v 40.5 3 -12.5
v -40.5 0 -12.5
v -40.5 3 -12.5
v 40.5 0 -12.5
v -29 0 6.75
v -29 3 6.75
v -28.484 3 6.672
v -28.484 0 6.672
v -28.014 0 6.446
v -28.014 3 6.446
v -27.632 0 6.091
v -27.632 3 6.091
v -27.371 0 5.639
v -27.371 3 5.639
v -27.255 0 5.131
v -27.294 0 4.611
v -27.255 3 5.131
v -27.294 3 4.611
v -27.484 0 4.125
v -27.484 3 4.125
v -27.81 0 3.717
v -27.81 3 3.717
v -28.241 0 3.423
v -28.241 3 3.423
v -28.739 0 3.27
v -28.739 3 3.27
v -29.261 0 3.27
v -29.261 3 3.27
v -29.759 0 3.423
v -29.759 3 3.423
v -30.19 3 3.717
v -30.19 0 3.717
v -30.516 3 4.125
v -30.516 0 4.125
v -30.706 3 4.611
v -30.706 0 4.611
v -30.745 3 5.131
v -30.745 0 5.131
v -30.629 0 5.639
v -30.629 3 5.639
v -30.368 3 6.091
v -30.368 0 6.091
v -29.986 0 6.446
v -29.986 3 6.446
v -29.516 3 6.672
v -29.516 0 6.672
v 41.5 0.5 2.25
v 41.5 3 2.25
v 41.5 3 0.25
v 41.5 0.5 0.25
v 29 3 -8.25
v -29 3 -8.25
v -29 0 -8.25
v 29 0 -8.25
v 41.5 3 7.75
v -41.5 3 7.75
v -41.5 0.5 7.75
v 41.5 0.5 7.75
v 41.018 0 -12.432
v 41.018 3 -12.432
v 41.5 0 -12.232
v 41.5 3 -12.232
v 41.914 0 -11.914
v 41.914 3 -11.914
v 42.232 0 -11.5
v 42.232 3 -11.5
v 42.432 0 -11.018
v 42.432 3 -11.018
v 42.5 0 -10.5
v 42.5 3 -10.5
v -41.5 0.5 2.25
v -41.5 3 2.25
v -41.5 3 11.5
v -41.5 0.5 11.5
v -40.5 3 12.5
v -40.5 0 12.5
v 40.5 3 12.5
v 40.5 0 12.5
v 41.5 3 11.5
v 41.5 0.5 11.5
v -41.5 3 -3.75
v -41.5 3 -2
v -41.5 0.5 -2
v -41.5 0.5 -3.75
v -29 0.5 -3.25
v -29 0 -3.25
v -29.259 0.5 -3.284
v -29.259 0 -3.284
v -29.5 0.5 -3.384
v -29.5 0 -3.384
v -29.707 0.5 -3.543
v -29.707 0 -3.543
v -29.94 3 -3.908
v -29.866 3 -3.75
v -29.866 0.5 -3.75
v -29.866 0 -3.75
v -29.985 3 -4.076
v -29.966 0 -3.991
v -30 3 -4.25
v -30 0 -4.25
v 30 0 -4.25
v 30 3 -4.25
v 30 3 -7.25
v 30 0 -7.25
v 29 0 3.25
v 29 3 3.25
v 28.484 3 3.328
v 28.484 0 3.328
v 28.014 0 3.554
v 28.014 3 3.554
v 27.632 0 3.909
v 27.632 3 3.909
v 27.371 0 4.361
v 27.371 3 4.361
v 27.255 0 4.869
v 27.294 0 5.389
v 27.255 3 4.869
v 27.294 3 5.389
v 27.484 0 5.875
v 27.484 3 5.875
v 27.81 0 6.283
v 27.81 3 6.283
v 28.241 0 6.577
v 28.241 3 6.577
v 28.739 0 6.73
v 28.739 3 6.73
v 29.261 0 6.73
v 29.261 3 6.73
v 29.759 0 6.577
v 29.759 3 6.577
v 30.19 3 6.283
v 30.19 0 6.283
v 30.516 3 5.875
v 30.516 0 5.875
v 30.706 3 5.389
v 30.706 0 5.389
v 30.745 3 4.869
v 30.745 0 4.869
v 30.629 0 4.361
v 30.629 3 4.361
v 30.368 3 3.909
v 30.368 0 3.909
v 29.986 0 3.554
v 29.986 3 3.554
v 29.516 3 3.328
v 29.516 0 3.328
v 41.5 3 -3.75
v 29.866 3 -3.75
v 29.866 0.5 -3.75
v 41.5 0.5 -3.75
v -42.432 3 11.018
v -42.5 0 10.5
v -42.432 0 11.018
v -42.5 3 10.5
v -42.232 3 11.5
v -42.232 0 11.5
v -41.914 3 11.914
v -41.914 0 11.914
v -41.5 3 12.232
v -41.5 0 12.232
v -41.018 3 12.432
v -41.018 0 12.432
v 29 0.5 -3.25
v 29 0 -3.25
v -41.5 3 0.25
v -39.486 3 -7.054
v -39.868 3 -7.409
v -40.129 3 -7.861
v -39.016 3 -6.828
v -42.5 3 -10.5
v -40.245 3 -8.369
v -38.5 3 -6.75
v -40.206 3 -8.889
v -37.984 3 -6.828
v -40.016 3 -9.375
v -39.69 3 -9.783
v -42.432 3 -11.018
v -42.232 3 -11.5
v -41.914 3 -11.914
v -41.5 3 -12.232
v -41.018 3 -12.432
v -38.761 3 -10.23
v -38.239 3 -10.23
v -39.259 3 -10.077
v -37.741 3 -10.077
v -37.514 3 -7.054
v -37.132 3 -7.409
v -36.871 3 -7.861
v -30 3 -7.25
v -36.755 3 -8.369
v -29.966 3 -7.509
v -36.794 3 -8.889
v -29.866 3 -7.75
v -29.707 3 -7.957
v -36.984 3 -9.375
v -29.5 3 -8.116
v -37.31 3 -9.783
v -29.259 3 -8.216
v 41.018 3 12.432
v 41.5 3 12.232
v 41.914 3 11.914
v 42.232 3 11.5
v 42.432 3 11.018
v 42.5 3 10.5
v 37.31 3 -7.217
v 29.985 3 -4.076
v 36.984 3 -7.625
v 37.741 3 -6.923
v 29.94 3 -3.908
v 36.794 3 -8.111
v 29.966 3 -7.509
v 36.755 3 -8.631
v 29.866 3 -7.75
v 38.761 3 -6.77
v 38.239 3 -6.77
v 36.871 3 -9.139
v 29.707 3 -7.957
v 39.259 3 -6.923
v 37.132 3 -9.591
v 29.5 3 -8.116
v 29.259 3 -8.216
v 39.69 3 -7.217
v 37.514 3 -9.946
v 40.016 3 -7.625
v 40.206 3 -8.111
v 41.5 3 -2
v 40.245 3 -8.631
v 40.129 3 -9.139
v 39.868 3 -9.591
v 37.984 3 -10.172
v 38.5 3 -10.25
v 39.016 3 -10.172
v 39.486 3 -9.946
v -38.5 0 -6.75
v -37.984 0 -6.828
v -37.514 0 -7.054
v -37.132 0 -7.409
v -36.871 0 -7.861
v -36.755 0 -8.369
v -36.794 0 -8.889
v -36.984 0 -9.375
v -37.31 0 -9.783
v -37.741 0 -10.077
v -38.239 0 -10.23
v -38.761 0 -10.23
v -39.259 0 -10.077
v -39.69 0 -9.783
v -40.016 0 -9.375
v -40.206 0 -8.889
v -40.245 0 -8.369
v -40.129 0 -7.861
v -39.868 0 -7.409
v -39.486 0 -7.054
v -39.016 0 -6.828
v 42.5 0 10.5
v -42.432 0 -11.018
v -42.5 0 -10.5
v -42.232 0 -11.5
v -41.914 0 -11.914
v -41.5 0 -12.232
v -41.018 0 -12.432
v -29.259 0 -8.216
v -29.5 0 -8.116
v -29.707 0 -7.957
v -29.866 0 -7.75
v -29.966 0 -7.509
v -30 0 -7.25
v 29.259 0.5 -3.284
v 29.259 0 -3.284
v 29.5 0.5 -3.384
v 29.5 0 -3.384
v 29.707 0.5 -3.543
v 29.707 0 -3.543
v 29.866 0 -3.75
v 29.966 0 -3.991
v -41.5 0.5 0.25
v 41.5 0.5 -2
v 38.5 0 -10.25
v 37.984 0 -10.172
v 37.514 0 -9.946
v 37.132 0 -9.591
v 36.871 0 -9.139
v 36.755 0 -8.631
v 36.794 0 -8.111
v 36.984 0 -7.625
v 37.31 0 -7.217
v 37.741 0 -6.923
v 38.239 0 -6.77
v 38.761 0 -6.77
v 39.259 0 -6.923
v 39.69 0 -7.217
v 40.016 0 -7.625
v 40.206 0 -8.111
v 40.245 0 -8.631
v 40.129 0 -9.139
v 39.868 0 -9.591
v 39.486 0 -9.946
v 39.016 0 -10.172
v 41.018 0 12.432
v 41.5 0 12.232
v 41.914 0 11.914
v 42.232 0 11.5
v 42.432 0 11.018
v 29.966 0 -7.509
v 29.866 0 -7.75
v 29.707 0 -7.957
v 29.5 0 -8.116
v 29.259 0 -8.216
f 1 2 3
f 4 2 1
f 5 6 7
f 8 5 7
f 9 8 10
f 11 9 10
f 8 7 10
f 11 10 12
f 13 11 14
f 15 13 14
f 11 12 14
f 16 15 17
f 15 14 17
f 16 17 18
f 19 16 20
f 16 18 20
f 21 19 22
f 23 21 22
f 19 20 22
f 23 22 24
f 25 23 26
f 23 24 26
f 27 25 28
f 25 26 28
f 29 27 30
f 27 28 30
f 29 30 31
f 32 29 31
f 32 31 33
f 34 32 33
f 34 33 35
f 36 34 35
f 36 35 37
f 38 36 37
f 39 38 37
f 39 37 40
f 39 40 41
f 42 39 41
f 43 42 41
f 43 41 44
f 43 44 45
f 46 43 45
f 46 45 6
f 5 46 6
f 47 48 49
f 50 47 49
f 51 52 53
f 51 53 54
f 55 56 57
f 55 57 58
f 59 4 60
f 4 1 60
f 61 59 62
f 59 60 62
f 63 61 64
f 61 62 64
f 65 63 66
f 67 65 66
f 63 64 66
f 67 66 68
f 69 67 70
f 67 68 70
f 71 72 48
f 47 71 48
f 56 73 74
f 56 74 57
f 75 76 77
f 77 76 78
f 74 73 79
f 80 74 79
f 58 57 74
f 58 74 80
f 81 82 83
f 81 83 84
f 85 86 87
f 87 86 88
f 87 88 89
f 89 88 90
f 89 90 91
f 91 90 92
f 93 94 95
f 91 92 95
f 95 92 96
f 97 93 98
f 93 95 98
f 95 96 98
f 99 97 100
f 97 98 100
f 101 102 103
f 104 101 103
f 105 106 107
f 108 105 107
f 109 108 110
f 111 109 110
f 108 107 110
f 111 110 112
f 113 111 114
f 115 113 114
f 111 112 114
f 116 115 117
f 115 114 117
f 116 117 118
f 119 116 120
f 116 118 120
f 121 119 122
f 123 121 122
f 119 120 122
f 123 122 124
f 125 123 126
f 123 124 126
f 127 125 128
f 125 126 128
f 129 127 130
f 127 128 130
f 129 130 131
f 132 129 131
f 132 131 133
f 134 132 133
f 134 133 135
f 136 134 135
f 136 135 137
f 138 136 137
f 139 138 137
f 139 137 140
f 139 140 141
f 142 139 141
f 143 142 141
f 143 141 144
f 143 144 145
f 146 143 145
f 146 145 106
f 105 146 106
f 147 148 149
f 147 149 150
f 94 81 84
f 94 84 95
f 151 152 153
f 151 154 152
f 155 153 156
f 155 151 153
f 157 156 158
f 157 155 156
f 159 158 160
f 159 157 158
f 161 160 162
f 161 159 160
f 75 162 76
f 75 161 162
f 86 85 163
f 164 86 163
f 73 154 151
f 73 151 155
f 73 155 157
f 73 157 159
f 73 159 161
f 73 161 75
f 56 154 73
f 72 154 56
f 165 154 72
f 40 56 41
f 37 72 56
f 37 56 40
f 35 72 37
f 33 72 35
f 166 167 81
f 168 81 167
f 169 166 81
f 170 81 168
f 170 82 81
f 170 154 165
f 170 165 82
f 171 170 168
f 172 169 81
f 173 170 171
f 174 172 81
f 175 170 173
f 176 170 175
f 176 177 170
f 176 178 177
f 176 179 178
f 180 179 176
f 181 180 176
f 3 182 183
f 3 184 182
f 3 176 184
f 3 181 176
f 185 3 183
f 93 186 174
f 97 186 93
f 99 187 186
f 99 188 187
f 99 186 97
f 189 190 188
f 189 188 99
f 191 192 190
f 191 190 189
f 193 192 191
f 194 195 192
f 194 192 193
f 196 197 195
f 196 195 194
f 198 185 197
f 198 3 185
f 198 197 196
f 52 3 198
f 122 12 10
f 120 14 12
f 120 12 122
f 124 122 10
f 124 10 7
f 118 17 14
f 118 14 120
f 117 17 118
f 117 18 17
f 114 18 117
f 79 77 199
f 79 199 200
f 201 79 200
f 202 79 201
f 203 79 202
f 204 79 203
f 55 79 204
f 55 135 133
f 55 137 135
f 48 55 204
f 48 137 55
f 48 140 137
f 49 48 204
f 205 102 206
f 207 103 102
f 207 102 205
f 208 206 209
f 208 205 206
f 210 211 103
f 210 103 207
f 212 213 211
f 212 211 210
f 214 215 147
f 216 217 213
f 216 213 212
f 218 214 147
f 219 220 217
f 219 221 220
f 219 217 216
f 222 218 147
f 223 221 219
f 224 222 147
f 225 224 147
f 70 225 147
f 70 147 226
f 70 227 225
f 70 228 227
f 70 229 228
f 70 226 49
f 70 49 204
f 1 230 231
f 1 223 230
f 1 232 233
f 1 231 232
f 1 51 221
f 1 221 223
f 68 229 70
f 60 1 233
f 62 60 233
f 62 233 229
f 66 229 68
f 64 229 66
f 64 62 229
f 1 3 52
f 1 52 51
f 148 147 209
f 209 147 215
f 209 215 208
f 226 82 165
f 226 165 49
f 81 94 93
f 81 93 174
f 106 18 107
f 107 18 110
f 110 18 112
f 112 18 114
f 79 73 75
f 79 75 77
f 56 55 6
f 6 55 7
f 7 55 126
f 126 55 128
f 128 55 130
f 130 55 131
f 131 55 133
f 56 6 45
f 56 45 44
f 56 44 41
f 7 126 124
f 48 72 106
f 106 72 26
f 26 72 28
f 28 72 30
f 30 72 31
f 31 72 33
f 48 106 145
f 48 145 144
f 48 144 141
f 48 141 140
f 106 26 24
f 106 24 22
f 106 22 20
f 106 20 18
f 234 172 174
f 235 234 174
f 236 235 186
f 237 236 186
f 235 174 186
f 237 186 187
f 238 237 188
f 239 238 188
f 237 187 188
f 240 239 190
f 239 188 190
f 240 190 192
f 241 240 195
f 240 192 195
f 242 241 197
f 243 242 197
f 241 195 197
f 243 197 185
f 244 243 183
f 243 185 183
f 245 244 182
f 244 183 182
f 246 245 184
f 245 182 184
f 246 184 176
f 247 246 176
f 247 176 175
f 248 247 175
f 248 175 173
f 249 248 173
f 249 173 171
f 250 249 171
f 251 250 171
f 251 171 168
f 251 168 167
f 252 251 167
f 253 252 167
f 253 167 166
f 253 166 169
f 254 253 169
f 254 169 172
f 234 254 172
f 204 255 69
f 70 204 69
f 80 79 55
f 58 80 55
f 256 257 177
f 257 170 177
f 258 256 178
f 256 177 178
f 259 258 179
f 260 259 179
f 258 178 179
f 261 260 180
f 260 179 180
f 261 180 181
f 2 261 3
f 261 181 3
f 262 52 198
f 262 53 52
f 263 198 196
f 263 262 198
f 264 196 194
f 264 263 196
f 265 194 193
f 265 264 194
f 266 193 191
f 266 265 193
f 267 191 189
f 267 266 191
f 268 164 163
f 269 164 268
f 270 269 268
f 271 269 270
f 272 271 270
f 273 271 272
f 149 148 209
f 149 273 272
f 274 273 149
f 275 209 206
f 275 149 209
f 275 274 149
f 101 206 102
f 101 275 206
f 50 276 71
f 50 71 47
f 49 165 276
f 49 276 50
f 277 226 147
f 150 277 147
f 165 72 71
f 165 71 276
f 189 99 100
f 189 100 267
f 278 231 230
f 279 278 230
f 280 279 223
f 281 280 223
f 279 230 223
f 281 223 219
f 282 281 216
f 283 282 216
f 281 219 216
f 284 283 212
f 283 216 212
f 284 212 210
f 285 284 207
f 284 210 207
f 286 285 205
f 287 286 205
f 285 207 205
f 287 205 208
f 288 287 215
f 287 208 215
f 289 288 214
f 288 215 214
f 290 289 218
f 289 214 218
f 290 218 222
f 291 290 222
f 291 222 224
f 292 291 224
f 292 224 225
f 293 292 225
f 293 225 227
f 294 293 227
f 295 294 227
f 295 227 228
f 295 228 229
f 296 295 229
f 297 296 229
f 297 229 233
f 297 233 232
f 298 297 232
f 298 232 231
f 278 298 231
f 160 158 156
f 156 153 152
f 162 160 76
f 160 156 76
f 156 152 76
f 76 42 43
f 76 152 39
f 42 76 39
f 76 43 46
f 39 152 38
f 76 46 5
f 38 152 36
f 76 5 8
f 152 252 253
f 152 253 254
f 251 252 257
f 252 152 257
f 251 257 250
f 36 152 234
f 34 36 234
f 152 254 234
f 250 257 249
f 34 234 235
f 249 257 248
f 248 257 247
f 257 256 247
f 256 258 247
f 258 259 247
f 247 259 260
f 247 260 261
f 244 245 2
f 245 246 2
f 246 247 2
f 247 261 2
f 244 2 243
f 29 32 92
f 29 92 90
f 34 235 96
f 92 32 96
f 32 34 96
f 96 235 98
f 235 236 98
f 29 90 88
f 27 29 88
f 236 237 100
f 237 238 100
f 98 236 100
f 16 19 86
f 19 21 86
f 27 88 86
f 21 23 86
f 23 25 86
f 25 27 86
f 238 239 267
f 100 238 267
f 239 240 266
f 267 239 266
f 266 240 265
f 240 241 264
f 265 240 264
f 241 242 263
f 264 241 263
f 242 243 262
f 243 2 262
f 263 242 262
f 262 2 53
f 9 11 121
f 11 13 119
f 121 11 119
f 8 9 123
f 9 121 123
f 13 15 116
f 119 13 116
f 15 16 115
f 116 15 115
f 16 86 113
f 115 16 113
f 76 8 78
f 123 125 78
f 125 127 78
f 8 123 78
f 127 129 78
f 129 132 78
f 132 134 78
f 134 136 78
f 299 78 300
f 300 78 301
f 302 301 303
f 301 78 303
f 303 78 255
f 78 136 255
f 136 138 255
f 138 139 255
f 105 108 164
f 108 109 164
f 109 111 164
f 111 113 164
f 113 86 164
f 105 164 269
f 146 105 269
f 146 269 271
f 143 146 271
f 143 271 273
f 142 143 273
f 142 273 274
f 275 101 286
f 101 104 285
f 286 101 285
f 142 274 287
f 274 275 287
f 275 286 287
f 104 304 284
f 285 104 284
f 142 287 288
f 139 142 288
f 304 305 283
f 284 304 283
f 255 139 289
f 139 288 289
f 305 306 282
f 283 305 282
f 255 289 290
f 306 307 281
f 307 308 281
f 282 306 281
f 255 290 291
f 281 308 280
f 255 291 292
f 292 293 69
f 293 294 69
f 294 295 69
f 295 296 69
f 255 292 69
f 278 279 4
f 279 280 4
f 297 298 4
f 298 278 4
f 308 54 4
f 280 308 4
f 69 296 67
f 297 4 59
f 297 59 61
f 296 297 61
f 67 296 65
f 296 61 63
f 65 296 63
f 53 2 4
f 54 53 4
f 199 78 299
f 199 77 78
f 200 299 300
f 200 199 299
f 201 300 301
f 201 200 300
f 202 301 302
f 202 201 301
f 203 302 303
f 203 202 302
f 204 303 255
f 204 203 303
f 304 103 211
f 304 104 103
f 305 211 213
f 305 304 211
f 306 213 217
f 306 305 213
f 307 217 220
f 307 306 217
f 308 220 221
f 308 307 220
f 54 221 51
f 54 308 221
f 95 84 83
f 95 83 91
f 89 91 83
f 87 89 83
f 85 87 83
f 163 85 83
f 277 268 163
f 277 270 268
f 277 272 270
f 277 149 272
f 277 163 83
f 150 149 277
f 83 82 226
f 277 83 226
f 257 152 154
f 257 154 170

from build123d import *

# Parameters (mm, degrees)
SKETCH1_W           = 85
SKETCH1_H           = 25
BOSS_EXTRUDE1_DEPTH = 3
SKETCH2_W           = 83
SKETCH2_H           = 3.75
SKETCH2_H_2         = 2
SKETCH2_H_3         = 1.75
CUT_EXTRUDE1_DEPTH  = 2.5
SKETCH3_R           = 1.75
CUT_EXTRUDE2_DEPTH  = 45.401576549
SKETCH4_W           = 60
SKETCH4_H           = 5
CUT_EXTRUDE3_DEPTH  = 45.401576549
FILLET1_R           = 1
FILLET2_R           = 2


with BuildPart() as part:
    # Sketch1 → Boss-Extrude1 (new body)
    with BuildSketch(Plane(origin=(0, 0, 0), x_dir=(1, 0, 0), z_dir=(0, 1, 0))):
        Rectangle(SKETCH1_W, SKETCH1_H)
    extrude(amount=BOSS_EXTRUDE1_DEPTH)

    # Sketch2 → Cut-Extrude1 (cut)
    with BuildSketch(Plane(origin=(0, 3, 0), x_dir=(1, 0, 0), z_dir=(0, 1, 0))):
        with Locations((0, -9.625)):
            Rectangle(SKETCH2_W, SKETCH2_H)
        with Locations((0, -1.25)):
            Rectangle(SKETCH2_W, SKETCH2_H_2)
        with Locations((0, 2.875)):
            Rectangle(SKETCH2_W, SKETCH2_H_3)
    extrude(amount=-CUT_EXTRUDE1_DEPTH, mode=Mode.SUBTRACT)

    # Sketch3 → Cut-Extrude2 (cut, through all)
    with BuildSketch(Plane(origin=(0, 3, 0), x_dir=(1, 0, 0), z_dir=(0, 1, 0))):
        with Locations(Location((-38.5, 8.5, 0), (0, 0, 270))):
            Circle(SKETCH3_R)
        with Locations(Location((38.5, 8.5, 0), (0, 0, 90))):
            Circle(SKETCH3_R)
        with Locations(Location((-29, -5, 0), (0, 0, 270))):
            Circle(SKETCH3_R)
        with Locations(Location((29, -5, 0), (0, 0, 90))):
            Circle(SKETCH3_R)
    extrude(amount=-CUT_EXTRUDE2_DEPTH, mode=Mode.SUBTRACT)

    # Sketch4 → Cut-Extrude3 (cut, through all)
    with BuildSketch(Plane(origin=(0, 3, 0), x_dir=(1, 0, 0), z_dir=(0, 1, 0))):
        with Locations((0, 5.75)):
            Rectangle(SKETCH4_W, SKETCH4_H)
    extrude(amount=-CUT_EXTRUDE3_DEPTH, mode=Mode.SUBTRACT)

    # Fillet1
    fillet1_edges = [part.edges().sort_by_distance(p)[0] for p in [
        (30, 0.25, -3.25),
        (30, 1.5, -8.25),
        (-30, 1.5, -8.25),
        (-30, 0.25, -3.25),
    ]]
    fillet(fillet1_edges, radius=FILLET1_R)

    # Fillet2
    fillet2_edges = [part.edges().sort_by_distance(p)[0] for p in [
        (-42.5, 1.5, -12.5),
        (42.5, 1.5, -12.5),
        (42.5, 1.5, 12.5),
        (-42.5, 1.5, 12.5),
    ]]
    fillet(fillet2_edges, radius=FILLET2_R)


solid = part.part
